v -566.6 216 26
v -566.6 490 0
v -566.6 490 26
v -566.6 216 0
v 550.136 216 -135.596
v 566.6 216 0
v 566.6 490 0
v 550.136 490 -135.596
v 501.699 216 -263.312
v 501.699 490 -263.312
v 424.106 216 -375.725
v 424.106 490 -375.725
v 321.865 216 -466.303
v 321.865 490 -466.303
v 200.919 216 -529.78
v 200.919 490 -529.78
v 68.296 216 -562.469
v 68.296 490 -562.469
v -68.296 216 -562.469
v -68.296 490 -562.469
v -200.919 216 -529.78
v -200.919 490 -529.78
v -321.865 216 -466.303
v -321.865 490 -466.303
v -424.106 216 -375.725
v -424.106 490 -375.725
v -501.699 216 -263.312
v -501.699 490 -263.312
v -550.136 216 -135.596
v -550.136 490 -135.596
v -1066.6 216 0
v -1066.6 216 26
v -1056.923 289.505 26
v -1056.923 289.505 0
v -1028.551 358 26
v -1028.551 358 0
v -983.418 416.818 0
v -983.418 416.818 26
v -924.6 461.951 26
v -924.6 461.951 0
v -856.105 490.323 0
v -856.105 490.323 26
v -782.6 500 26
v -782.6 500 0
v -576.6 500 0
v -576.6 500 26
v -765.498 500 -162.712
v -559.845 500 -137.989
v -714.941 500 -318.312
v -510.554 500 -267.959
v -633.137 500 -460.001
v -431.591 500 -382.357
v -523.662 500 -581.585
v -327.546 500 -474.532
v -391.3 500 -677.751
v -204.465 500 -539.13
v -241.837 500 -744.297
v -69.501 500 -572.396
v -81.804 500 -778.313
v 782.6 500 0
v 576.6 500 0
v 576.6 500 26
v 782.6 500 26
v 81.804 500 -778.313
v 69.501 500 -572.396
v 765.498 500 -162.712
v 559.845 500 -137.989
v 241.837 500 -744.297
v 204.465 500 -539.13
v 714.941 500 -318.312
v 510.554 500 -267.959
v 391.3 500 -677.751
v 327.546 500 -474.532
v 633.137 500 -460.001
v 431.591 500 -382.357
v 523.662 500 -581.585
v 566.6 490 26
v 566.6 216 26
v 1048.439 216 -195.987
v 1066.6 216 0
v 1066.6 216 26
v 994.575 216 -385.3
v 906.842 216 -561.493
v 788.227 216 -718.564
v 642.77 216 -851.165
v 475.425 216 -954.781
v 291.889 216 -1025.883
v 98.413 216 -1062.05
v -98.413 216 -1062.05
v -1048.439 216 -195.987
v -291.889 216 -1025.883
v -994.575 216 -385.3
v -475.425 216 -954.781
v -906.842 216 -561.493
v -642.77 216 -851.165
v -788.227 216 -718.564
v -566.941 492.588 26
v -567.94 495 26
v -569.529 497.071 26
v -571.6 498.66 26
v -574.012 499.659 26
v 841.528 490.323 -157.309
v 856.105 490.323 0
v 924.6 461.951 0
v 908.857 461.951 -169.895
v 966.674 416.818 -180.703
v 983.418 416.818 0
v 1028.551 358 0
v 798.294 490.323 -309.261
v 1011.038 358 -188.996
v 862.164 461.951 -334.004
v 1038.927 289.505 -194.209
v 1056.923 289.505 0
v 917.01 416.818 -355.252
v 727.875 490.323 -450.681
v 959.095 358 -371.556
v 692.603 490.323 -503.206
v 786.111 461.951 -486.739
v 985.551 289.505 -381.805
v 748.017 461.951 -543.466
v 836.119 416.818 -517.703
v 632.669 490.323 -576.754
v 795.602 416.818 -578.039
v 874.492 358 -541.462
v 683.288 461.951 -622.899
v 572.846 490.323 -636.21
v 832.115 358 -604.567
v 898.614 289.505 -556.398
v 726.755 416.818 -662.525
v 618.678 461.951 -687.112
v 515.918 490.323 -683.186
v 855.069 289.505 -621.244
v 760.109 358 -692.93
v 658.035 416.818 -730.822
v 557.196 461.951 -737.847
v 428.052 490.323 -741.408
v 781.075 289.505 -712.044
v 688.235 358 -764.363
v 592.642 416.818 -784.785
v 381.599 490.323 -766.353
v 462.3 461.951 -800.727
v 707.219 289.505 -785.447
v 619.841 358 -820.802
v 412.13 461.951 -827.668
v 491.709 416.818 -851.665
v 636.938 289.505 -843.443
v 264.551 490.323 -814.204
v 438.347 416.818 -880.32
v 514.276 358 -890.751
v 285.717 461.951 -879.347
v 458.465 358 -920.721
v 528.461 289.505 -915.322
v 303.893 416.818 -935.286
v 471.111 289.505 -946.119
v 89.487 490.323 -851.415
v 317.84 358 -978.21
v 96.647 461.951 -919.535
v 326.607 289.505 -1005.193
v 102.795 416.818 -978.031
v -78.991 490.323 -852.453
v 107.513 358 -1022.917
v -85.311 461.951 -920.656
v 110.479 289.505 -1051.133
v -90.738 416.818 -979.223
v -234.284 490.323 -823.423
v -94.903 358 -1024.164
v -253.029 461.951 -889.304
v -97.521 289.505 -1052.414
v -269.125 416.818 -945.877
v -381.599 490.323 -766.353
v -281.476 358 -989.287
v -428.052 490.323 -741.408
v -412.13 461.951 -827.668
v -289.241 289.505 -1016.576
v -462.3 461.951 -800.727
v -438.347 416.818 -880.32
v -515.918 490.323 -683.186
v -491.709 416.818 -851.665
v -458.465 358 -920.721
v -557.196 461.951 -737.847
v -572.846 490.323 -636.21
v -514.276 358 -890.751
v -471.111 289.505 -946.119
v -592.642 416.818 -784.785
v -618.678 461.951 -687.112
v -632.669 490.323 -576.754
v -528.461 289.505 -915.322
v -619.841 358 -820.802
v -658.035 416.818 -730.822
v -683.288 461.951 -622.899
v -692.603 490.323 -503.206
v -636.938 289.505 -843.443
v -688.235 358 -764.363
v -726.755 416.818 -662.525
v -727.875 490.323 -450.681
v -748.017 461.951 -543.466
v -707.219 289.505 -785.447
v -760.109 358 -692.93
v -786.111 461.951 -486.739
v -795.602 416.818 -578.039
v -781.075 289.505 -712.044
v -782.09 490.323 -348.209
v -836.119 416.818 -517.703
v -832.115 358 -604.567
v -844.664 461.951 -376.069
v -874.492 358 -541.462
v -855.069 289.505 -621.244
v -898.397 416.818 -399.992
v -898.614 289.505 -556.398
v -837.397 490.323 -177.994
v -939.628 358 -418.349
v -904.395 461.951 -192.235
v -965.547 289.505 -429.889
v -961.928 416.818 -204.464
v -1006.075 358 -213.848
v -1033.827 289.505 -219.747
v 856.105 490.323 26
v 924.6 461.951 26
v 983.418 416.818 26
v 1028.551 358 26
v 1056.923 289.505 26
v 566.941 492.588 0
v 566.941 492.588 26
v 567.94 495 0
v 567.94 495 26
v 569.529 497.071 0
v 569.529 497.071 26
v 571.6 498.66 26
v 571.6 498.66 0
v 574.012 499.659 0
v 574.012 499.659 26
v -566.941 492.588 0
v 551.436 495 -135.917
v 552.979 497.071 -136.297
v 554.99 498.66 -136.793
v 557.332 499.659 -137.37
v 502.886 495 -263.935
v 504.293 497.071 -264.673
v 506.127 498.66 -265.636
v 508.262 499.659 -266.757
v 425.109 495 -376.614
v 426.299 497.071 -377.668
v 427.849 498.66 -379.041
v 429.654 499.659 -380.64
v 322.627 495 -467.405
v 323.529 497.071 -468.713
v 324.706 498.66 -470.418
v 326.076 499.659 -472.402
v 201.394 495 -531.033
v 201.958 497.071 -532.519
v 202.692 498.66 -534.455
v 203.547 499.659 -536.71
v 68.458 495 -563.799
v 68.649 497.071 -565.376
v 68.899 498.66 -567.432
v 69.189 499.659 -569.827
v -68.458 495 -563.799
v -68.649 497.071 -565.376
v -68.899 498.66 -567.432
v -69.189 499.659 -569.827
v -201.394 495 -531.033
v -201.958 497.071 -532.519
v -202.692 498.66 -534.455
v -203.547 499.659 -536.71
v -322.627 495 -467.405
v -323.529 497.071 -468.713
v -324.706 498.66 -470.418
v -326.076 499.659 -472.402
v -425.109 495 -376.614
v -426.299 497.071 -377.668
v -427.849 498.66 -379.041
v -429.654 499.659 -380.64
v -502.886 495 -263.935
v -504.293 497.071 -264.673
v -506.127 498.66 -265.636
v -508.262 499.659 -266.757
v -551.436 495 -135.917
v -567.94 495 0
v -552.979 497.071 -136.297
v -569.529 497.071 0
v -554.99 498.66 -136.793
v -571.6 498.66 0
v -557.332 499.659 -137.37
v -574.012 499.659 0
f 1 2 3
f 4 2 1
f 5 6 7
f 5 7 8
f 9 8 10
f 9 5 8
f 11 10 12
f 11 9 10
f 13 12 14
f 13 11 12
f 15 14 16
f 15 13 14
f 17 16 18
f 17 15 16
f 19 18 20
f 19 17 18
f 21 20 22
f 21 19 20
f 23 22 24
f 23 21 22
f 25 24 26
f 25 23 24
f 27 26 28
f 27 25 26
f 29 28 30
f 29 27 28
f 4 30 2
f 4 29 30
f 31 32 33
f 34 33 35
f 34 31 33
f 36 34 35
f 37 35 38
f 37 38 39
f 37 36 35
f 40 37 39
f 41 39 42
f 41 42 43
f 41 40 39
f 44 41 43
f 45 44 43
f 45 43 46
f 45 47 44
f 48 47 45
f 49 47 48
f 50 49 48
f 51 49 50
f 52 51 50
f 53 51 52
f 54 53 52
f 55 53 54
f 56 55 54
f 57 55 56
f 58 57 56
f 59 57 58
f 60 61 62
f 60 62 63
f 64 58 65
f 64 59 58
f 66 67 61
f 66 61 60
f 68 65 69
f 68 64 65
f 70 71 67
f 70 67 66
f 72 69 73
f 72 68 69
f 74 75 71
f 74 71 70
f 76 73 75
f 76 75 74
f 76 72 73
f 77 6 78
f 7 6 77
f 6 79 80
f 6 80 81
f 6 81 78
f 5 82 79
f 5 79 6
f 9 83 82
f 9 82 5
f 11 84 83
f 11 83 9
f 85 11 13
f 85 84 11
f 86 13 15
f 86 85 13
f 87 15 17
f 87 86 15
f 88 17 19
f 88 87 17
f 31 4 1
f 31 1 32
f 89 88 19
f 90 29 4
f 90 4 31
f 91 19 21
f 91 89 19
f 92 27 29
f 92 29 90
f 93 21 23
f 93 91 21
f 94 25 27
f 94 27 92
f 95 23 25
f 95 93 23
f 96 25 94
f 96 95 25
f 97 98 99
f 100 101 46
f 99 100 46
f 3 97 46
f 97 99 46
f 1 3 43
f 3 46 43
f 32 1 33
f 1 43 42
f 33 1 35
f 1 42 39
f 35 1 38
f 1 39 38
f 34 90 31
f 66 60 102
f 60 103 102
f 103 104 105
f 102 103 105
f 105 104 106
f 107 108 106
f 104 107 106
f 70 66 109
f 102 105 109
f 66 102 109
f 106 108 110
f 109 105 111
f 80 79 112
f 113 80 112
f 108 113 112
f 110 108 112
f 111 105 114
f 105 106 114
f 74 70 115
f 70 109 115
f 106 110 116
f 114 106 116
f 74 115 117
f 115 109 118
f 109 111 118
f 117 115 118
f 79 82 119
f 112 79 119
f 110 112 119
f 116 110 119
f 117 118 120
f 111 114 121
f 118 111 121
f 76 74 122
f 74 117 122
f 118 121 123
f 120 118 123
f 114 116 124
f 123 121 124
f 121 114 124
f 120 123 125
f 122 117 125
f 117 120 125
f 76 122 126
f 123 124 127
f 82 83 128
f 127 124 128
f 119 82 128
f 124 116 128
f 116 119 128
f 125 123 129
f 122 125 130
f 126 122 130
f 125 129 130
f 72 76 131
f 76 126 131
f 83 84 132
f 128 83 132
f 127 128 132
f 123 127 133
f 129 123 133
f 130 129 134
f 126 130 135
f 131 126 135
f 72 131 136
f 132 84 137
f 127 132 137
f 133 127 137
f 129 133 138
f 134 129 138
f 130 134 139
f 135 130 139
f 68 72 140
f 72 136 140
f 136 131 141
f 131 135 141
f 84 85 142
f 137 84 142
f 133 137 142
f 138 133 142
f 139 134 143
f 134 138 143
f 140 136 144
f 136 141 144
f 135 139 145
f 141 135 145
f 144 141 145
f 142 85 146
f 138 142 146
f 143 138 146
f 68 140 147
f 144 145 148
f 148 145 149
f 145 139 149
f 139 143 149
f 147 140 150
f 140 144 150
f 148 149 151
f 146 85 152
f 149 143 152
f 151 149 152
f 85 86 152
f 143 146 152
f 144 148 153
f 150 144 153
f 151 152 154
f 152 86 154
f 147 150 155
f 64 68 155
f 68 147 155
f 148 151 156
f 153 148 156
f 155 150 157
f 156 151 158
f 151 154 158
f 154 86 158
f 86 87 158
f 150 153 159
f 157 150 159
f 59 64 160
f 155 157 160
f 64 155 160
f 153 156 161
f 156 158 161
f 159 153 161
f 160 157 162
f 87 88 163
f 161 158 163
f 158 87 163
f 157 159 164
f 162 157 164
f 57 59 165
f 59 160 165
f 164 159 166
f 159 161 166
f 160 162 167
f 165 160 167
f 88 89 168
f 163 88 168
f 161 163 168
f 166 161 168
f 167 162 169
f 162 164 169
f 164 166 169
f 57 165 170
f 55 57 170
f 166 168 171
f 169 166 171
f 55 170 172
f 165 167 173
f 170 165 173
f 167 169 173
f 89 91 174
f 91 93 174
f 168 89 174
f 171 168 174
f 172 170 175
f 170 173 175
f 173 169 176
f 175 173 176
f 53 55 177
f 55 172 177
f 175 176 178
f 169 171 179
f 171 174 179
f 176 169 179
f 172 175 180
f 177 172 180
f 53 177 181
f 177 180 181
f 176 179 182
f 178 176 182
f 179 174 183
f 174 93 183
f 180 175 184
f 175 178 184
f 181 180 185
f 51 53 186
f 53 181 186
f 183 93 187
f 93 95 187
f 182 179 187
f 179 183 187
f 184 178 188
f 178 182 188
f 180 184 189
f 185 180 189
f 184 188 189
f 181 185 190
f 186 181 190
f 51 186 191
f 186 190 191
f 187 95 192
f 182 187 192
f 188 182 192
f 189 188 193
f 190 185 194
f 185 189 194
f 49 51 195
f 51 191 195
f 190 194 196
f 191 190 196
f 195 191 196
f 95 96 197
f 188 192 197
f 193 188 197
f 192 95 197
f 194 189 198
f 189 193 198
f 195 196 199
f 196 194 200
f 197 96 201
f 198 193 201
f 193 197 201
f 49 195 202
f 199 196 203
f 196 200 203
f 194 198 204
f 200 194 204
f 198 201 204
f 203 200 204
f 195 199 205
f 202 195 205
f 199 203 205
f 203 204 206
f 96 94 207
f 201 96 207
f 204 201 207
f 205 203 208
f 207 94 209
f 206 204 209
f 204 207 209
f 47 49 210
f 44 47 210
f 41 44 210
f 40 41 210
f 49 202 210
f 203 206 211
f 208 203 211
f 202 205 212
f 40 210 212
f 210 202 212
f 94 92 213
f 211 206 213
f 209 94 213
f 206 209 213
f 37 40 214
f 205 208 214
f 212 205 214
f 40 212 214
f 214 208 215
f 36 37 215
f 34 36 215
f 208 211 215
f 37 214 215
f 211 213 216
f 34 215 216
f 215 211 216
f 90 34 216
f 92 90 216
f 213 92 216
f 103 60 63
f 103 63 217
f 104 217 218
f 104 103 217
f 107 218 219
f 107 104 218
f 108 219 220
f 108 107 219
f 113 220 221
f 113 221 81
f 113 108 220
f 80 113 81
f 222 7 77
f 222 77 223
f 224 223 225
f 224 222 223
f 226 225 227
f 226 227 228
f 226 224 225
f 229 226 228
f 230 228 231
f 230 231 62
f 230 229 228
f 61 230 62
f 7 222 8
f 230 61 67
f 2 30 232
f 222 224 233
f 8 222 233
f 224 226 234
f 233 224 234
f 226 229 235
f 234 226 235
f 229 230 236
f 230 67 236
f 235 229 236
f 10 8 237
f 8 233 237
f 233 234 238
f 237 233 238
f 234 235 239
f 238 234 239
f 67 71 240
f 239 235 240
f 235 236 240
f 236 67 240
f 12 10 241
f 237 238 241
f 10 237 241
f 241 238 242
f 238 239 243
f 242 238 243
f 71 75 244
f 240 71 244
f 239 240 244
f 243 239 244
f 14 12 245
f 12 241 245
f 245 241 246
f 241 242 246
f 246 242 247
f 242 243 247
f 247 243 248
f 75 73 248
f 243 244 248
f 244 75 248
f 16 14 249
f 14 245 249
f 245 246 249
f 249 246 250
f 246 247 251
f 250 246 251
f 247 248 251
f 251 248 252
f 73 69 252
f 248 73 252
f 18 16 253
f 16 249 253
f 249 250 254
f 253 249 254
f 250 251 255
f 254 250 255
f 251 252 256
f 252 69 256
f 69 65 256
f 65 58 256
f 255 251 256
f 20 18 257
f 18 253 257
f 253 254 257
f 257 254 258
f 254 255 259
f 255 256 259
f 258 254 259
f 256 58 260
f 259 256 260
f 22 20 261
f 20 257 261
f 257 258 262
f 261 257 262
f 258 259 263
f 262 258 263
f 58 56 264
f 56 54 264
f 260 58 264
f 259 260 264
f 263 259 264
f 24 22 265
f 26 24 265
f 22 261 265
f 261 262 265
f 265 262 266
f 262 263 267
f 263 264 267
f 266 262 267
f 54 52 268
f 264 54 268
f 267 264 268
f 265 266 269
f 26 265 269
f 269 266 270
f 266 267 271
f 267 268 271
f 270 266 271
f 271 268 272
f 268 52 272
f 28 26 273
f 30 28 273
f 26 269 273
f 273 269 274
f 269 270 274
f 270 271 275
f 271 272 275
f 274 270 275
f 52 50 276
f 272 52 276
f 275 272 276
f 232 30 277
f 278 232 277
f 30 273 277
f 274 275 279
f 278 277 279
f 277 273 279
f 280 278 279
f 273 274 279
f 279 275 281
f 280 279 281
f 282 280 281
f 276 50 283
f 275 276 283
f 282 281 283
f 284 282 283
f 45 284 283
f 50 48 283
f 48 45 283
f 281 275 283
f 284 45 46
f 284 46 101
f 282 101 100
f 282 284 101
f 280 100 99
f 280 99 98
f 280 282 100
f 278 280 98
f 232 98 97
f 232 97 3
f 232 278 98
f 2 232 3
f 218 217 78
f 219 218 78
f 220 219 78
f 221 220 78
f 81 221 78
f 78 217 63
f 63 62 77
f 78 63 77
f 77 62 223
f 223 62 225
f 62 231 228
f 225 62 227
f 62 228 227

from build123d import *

# Parameters (mm, degrees)
BOSS_EXTRUDE1_DEPTH = 500
FILLET1_R           = 10
BOSS_EXTRUDE2_DEPTH = 26


with BuildPart() as part:
    # Sketch1 → Boss-Extrude1 (new body)
    with BuildSketch(Plane(origin=(0, 0, 0), x_dir=(1, 0, 0), z_dir=(0, 1, 0))):
        with BuildLine():
            Line((-566.6, 0), (-1066.6, 0))
            ThreePointArc((-1066.6, 0), (0, 1066.6), (1066.6, 0))
            Line((1066.6, 0), (566.6, 0))
            ThreePointArc((566.6, 0), (0, 566.6), (-566.6, 0))
        make_face()
    extrude(amount=BOSS_EXTRUDE1_DEPTH)

    # Fillet1
    fillet1_edges = [part.edges().sort_by_distance(p)[0] for p in [
        (0, 500, -1066.6),
        (0, 500, -566.6),
        (0, 0, -1066.6),
        (0, 0, -566.6),
    ]]
    fillet(fillet1_edges, radius=FILLET1_R)

    # Sketch2 → Cut-Revolve1 (revolve, cut)
    with BuildSketch(Plane.XY):
        with BuildLine():
            Line((-1066.6, 216), (-566.6, 216))
            Line((-566.6, 216), (-566.6, 0))
            Line((-566.6, 0), (-1145.861102691, 0))
            Line((-1145.861102691, 0), (-1145.861102691, 500))
            Line((-1145.861102691, 500), (-782.6, 500))
            ThreePointArc((-782.6, 500), (-983.418325857, 416.818325857), (-1066.6, 216))
        make_face()
    revolve(axis=Axis((0, 0, 0), (0, 1, 0)), mode=Mode.SUBTRACT)

    # Sketch3 → Boss-Extrude2 (add)
    with BuildSketch(Plane.XY):
        with BuildLine():
            Line((-782.6, 500), (-576.6, 500))
            ThreePointArc((-576.6, 500), (-569.528932188, 497.071067812), (-566.6, 490))
            Line((-566.6, 490), (-566.6, 216))
            Line((-566.6, 216), (-1066.6, 216))
            ThreePointArc((-1066.6, 216), (-983.418325857, 416.818325857), (-782.6, 500))
        make_face()
        with BuildLine():
            Line((576.6, 500), (782.6, 500))
            ThreePointArc((782.6, 500), (983.418325857, 416.818325857), (1066.6, 216))
            Line((1066.6, 216), (566.6, 216))
            Line((566.6, 216), (566.6, 490))
            ThreePointArc((566.6, 490), (569.528932188, 497.071067812), (576.6, 500))
        make_face()
    extrude(amount=BOSS_EXTRUDE2_DEPTH)


solid = part.part
